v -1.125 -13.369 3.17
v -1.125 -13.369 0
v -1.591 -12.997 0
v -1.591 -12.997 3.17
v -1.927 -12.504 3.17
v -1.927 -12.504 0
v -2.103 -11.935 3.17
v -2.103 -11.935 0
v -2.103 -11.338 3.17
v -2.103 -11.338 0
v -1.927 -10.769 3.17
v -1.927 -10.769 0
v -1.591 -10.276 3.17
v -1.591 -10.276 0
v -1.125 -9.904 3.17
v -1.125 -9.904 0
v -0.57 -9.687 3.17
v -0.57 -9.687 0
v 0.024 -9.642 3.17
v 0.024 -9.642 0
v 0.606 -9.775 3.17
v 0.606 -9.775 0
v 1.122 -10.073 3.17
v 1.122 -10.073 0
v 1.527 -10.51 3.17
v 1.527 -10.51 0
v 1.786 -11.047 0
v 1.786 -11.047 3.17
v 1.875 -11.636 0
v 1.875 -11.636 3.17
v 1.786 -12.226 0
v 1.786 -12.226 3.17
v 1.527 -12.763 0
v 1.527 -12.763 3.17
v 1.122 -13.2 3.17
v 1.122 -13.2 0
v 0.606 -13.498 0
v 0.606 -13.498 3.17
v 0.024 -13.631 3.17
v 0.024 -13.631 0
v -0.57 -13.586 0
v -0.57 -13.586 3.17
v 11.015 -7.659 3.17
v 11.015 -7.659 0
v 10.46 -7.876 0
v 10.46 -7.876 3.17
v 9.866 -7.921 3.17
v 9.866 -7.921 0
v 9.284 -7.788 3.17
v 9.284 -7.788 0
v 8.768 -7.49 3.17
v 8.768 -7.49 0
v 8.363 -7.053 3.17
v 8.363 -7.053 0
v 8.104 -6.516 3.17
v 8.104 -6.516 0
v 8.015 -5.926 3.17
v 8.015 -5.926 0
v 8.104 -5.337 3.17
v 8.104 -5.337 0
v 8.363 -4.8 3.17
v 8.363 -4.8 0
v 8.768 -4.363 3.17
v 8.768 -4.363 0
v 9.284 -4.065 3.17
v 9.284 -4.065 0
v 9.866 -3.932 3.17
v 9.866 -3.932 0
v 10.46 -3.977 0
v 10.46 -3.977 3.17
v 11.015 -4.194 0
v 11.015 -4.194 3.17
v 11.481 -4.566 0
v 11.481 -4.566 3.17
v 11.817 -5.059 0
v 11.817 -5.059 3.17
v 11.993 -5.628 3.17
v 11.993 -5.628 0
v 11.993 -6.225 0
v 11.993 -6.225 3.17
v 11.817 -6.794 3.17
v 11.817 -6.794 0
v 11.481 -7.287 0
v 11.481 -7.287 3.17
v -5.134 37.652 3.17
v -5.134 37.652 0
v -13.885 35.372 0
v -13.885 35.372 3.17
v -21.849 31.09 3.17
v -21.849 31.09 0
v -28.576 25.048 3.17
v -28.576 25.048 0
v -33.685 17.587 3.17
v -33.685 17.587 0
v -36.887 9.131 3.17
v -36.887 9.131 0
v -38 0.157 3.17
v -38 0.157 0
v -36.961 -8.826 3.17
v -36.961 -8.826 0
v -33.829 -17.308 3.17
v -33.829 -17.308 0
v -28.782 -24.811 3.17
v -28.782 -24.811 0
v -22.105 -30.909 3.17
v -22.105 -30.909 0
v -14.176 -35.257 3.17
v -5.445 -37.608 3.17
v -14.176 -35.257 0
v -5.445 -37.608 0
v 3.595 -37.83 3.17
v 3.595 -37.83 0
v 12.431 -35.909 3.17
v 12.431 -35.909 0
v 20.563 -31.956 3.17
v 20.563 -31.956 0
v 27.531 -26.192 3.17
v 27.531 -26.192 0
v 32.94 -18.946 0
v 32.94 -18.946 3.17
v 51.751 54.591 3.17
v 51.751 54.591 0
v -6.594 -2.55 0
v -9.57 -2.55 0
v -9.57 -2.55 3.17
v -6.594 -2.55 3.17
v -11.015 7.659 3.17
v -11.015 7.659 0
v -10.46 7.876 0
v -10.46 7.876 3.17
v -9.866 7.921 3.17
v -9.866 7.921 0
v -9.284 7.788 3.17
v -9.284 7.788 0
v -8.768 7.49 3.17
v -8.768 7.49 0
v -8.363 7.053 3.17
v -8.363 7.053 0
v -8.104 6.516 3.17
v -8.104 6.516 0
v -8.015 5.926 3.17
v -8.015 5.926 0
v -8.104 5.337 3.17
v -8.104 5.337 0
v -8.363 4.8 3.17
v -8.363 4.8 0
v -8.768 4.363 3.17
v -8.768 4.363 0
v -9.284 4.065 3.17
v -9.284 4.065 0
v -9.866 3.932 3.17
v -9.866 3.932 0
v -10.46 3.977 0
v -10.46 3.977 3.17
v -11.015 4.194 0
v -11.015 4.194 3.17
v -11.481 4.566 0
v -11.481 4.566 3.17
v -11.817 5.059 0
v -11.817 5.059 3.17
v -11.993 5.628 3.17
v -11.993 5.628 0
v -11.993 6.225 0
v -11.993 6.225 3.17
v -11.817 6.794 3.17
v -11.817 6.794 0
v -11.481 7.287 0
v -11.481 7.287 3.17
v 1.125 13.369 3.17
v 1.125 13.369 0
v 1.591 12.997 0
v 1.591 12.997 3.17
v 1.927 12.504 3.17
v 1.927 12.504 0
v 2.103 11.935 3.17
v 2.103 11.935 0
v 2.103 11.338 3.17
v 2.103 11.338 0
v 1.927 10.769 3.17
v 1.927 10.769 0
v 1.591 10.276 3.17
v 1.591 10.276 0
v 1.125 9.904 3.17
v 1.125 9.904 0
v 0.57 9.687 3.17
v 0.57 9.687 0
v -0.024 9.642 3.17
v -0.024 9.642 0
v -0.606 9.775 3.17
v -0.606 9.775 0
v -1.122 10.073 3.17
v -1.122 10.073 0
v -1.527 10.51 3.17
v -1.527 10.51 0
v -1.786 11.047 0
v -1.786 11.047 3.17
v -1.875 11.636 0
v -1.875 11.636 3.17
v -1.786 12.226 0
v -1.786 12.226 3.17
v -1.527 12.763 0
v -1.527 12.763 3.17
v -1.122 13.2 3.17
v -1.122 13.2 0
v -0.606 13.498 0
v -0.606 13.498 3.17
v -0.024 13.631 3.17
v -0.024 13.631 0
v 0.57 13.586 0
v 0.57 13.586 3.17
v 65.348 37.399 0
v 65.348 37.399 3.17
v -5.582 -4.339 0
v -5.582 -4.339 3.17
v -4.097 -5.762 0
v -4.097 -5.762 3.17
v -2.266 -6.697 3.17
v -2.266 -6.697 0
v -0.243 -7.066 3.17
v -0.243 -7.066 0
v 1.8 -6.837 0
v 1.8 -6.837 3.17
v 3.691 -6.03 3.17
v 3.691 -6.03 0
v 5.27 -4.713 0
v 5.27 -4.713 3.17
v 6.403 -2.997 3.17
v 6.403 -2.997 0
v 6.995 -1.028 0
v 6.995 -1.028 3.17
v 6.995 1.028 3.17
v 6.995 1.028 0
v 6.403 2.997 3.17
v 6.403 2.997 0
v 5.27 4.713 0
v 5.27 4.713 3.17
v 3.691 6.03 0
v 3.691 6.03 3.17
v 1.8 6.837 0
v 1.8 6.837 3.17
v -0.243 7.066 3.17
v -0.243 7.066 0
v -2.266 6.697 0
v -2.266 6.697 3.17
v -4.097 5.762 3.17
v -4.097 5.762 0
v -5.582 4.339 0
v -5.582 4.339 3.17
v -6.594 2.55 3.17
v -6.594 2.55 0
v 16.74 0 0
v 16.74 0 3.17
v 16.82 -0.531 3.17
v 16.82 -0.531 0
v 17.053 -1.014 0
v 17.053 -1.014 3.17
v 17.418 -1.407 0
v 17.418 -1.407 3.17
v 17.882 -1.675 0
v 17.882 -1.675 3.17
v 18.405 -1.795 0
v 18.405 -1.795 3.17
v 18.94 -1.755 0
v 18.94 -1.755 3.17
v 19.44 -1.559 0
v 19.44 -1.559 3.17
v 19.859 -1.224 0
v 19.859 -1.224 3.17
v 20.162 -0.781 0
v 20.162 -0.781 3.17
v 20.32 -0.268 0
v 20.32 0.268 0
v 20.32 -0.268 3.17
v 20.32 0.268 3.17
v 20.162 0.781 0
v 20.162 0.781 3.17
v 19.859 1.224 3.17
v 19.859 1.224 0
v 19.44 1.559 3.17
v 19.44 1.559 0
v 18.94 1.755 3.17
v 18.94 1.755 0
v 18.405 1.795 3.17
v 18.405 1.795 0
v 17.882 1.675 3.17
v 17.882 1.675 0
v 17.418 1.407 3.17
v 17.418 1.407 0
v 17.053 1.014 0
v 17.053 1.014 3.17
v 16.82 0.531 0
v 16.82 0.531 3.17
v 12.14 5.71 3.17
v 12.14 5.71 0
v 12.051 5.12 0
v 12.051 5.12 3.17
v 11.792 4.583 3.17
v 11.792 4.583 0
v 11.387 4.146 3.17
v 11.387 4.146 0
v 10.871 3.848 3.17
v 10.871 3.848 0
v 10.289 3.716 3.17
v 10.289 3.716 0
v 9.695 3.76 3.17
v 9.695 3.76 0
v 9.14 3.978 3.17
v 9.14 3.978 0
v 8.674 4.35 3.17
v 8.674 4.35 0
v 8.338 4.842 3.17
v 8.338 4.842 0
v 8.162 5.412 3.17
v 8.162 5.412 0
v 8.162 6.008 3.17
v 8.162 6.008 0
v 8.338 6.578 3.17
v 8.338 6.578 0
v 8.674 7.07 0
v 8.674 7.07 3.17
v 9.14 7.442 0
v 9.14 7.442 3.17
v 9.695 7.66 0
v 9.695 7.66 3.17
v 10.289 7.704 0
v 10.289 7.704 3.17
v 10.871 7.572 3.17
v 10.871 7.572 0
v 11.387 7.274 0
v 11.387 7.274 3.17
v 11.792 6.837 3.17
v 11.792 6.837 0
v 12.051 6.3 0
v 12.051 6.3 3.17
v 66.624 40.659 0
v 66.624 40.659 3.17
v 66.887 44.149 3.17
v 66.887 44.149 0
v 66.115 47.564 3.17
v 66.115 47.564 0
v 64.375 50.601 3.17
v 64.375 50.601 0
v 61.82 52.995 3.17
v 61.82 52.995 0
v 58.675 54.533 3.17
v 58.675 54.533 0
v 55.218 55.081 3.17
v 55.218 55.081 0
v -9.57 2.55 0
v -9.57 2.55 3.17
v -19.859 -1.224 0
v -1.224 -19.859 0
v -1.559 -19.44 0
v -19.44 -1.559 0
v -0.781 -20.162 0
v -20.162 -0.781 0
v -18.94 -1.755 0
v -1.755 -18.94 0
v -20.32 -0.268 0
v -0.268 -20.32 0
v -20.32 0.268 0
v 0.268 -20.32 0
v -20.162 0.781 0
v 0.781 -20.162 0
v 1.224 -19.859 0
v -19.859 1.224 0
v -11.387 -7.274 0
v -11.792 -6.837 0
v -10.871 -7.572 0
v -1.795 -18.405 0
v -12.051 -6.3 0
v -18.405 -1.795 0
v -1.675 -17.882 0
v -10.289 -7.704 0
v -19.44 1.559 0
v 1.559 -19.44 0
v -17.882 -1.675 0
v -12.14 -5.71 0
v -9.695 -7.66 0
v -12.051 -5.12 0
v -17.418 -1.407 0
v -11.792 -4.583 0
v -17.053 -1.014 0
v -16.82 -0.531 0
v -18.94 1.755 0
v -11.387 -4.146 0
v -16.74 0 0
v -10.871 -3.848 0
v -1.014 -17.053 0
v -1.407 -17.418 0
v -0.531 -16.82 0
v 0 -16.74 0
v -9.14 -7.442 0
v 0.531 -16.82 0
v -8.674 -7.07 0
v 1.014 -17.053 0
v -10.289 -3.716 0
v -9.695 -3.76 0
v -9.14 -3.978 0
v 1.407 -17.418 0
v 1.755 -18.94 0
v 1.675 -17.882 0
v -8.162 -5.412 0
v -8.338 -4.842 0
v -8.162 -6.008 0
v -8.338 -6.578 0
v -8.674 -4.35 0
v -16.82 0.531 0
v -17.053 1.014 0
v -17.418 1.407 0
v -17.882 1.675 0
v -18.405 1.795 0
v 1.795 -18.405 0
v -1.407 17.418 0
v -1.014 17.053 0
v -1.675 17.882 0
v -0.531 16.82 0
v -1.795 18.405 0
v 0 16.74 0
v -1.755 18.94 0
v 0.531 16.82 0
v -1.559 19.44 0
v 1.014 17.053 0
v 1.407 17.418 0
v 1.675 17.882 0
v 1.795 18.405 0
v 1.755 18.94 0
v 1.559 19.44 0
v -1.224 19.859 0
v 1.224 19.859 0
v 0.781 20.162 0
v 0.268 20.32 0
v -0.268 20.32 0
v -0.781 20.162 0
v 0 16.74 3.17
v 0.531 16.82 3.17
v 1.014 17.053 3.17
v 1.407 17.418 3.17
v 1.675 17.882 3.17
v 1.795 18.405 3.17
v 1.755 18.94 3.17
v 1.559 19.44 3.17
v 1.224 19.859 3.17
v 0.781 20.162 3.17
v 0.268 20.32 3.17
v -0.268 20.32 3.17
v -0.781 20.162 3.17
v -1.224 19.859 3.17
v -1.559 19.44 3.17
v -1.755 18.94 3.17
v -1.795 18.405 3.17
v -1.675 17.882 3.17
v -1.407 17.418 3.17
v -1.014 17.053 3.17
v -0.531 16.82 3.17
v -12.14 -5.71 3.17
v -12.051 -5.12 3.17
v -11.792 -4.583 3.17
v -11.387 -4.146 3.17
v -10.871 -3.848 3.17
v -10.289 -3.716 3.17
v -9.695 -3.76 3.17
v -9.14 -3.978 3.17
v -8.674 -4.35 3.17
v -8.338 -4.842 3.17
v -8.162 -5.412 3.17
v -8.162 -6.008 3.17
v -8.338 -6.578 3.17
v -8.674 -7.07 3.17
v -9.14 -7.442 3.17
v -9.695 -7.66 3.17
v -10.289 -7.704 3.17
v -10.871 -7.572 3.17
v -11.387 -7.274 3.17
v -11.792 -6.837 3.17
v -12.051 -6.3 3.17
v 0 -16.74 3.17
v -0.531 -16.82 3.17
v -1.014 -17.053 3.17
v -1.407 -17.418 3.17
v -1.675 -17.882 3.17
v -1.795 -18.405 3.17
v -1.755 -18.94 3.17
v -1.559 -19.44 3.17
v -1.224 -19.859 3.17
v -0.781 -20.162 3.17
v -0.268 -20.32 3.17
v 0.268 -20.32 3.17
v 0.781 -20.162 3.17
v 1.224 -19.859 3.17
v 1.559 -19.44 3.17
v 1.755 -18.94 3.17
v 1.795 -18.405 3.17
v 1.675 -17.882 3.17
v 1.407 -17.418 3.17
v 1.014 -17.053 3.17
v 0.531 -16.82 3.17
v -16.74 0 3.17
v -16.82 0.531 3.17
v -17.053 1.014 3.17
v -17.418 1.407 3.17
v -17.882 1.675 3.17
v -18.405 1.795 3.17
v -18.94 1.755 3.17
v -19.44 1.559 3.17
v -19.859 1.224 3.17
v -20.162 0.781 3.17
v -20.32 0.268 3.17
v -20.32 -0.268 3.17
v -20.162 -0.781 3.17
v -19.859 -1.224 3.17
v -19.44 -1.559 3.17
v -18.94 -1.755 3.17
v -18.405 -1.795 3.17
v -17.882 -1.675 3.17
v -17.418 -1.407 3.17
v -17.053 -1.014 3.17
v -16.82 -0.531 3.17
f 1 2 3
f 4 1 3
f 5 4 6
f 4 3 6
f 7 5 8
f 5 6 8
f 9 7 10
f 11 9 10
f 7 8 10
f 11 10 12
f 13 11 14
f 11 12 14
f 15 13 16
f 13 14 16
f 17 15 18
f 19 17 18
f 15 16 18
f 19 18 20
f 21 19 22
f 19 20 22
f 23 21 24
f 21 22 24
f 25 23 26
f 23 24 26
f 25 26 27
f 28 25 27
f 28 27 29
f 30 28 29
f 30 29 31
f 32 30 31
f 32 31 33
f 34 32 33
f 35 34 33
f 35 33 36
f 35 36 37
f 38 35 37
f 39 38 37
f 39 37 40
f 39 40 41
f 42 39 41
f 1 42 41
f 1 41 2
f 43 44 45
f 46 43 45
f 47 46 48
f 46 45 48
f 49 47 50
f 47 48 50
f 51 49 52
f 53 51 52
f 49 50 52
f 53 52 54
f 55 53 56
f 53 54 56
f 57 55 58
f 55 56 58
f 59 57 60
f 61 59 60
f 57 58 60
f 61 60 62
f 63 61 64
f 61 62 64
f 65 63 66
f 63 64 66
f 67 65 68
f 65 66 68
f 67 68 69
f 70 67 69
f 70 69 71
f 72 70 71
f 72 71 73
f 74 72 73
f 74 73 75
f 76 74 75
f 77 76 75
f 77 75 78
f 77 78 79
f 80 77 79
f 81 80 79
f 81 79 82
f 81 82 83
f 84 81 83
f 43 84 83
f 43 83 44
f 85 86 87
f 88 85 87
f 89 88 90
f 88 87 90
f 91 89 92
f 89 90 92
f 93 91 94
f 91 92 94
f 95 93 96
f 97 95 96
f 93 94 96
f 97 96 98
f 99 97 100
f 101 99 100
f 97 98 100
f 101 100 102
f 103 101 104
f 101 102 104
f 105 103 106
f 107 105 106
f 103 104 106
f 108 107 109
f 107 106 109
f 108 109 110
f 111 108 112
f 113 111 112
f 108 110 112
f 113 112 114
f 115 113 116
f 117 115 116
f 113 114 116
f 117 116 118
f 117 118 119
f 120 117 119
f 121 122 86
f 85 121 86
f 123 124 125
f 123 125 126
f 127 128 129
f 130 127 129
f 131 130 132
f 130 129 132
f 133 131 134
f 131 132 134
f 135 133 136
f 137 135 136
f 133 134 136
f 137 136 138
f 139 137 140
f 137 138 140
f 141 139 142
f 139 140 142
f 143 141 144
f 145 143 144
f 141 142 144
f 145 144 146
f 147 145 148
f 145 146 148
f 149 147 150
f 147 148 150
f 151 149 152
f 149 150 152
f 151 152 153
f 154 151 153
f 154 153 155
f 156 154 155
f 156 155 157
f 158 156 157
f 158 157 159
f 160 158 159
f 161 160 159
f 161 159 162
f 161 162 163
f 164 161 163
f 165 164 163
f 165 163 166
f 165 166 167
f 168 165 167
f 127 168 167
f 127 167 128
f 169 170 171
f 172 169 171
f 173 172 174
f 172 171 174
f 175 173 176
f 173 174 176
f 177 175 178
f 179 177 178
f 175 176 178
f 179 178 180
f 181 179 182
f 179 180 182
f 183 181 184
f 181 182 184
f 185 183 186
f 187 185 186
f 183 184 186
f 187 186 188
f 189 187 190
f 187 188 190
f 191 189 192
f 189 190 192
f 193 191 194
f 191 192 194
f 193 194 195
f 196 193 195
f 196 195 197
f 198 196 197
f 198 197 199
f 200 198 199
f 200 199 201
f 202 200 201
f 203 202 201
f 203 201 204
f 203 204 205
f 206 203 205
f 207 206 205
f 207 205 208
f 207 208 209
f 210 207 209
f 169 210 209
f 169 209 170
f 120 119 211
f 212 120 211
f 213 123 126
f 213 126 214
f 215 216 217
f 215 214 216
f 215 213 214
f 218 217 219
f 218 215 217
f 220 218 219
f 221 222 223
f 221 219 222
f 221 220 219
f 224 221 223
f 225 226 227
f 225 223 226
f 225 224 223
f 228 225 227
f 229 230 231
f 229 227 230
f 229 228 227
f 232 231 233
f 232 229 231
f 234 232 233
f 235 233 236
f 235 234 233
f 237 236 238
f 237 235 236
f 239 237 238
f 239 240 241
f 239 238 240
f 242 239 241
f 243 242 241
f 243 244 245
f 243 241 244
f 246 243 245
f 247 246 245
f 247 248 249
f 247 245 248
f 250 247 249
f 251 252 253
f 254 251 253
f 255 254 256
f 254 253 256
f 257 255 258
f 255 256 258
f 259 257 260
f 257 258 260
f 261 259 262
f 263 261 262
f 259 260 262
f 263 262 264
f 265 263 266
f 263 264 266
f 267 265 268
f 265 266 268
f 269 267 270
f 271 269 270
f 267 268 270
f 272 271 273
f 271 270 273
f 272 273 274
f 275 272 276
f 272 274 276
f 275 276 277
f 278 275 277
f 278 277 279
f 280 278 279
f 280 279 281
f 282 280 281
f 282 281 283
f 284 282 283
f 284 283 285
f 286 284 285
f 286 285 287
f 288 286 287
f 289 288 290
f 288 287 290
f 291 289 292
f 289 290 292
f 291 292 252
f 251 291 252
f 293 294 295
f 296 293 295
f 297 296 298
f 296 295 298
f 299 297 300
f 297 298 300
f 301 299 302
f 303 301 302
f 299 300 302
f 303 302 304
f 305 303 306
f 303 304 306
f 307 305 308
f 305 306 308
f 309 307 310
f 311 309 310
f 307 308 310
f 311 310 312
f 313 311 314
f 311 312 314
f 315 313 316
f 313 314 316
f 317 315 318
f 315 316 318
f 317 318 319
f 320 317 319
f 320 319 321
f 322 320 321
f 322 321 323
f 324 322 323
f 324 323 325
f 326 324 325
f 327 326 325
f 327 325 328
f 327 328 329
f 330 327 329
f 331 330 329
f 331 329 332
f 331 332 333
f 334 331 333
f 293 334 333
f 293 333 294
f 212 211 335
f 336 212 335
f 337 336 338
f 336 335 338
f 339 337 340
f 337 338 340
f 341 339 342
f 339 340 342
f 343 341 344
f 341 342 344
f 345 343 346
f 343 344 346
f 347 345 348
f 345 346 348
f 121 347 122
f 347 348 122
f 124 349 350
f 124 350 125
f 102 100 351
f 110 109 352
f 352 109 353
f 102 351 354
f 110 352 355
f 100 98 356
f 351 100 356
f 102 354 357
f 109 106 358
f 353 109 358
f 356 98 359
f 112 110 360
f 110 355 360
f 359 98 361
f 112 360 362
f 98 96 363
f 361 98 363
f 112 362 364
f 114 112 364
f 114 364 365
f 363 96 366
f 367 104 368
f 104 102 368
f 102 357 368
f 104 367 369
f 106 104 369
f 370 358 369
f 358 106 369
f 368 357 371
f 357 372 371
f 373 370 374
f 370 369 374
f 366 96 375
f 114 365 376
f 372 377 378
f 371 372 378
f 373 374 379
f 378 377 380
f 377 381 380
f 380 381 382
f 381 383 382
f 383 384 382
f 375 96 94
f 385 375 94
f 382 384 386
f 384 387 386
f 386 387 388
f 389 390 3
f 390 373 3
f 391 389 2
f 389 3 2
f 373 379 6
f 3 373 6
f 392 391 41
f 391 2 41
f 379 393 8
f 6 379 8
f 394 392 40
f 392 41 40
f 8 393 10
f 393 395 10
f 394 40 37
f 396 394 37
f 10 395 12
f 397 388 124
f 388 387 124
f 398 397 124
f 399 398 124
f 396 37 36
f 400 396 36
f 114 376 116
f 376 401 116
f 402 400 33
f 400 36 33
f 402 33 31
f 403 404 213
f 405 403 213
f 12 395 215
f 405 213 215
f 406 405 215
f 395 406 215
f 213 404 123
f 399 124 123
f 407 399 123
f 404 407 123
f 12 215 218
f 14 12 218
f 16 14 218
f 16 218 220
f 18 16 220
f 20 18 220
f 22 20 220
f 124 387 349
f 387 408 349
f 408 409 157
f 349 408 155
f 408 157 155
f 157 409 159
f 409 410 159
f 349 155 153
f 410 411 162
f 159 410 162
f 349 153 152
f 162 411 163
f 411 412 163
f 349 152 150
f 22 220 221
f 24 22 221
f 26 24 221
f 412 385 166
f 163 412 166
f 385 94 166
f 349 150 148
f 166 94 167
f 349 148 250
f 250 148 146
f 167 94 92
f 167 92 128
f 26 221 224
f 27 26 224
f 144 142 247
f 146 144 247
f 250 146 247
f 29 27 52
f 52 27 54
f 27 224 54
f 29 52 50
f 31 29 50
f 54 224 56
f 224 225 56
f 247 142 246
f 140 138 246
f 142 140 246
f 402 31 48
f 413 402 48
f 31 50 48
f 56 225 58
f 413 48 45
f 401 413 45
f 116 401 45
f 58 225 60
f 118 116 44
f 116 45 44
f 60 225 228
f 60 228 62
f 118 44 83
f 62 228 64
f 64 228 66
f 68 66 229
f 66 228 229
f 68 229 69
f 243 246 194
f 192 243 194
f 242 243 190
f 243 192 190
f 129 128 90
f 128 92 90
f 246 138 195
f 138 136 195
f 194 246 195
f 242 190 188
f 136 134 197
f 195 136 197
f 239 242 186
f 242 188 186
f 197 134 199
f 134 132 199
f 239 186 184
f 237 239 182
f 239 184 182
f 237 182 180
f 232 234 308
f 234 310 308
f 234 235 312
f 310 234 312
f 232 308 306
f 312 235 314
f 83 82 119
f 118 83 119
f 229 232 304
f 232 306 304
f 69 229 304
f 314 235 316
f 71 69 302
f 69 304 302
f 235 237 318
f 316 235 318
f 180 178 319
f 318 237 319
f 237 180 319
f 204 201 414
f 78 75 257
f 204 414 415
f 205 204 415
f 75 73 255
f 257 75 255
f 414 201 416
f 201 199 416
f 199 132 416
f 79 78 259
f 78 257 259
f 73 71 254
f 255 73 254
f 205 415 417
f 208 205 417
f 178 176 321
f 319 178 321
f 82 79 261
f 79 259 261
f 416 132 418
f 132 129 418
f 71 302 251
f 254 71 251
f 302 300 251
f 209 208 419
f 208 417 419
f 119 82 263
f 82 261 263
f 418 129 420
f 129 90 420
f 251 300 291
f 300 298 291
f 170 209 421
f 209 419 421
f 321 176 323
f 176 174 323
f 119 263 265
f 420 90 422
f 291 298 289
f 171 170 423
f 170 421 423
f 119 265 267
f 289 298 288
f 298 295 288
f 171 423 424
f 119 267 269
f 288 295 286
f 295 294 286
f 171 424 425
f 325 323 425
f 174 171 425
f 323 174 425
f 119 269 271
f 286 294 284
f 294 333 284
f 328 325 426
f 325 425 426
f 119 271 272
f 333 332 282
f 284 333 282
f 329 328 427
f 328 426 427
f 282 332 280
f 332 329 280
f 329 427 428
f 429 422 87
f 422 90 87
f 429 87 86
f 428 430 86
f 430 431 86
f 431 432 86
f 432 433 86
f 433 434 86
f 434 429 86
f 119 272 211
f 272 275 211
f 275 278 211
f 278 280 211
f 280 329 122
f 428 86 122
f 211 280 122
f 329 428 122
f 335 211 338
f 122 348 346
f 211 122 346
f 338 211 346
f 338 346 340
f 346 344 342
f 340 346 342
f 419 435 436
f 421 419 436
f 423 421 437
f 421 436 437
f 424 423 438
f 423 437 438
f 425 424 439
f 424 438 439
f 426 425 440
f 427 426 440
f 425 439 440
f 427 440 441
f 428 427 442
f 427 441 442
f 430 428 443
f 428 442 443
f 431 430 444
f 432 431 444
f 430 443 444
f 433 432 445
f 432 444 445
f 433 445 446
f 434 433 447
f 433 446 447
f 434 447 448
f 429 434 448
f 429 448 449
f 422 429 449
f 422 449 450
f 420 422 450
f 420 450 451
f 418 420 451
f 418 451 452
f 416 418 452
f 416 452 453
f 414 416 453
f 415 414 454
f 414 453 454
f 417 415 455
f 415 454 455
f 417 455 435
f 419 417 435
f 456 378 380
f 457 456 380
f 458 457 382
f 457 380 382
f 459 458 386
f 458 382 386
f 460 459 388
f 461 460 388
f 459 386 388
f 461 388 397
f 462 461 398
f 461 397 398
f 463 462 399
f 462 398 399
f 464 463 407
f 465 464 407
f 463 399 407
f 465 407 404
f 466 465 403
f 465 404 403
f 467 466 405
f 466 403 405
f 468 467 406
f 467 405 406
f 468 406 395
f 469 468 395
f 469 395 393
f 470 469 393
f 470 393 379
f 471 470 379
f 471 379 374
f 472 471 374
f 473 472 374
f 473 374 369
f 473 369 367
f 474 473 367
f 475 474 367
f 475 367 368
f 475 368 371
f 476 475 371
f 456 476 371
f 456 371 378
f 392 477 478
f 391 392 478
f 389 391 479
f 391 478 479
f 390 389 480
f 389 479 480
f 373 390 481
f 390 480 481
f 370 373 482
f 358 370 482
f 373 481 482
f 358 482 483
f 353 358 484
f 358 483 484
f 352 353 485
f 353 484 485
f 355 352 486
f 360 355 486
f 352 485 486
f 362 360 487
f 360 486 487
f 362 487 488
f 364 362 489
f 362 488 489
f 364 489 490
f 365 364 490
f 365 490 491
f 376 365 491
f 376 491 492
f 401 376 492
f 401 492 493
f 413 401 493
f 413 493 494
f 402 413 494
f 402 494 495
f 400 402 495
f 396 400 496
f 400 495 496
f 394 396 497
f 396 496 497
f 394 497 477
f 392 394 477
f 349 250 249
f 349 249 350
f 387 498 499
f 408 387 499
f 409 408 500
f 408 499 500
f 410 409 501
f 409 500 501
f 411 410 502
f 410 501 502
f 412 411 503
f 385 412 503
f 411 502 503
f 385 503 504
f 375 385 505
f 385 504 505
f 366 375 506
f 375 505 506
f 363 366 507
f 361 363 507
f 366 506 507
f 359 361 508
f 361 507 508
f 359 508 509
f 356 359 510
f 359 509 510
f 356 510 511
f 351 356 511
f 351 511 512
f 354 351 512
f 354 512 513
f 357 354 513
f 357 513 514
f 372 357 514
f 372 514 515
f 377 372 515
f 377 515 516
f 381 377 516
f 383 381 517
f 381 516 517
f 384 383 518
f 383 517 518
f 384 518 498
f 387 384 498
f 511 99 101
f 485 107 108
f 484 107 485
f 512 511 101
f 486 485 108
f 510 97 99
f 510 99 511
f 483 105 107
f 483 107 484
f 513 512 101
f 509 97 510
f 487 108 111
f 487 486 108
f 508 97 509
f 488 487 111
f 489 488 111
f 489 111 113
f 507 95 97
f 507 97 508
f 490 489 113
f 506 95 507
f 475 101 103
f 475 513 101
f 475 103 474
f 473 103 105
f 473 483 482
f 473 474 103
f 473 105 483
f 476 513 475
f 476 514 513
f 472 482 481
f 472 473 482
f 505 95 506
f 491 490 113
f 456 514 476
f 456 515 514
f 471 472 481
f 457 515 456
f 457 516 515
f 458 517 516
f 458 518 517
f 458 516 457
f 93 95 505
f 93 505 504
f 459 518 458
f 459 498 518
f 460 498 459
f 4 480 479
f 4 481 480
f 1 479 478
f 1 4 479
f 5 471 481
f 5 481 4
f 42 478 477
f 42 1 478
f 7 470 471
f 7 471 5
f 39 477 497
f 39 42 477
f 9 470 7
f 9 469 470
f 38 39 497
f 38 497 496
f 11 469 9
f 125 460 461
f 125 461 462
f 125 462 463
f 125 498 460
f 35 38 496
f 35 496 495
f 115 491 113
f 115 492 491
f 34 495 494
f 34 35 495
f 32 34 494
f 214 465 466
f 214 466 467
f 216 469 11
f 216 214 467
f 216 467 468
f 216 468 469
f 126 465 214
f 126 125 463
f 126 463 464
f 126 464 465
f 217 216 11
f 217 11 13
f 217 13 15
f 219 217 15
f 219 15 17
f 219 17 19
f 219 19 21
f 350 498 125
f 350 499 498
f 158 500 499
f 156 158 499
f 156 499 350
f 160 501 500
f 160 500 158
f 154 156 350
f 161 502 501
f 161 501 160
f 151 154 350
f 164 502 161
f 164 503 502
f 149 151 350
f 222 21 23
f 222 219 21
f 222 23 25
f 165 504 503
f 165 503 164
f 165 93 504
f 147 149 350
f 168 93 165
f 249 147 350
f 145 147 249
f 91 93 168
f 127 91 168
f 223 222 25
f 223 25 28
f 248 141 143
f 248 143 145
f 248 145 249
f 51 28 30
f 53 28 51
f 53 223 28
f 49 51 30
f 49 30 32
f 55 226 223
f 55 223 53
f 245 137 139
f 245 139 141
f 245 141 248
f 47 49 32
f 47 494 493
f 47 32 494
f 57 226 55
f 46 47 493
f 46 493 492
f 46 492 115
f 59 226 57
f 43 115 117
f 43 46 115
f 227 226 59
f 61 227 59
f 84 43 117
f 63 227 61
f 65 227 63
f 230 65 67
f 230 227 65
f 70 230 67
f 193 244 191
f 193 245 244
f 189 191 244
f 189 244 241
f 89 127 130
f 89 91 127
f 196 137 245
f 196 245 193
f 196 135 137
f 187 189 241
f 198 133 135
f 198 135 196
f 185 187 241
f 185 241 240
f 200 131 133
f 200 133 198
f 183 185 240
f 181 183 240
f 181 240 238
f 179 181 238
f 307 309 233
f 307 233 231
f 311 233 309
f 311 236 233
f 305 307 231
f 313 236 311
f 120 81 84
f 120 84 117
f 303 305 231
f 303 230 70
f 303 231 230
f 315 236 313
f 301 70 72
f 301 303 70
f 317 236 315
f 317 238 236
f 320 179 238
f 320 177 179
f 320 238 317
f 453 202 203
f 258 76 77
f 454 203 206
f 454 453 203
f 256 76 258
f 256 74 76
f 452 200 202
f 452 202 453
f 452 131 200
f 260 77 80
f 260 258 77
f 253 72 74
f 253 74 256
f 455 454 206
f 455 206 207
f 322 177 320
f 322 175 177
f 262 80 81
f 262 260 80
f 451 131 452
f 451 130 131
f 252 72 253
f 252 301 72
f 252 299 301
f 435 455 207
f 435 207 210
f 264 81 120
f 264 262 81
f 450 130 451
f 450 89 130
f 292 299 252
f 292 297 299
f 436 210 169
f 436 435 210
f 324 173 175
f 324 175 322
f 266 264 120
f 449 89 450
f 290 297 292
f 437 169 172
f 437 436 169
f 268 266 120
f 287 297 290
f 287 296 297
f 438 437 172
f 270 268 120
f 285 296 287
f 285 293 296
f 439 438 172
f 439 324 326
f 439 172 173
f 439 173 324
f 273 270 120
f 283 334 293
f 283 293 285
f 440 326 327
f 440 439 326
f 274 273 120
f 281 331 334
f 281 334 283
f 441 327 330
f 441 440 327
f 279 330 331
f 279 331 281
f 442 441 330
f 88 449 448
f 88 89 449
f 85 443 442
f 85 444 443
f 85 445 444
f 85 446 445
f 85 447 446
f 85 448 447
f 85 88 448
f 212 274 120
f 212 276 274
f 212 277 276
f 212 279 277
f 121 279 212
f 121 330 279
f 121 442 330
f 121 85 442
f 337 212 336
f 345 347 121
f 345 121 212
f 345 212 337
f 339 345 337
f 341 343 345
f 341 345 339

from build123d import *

# Parameters (mm, degrees)
SKETCH1_R             = 7.07
BOSS_EXTRUDE2_DEPTH   = 3.17
SKETCH2_R             = 1.799813297
CUT_EXTRUDE1_DEPTH    = 3.17
CIRPATTERN1_COUNT     = 4
F_4_0MM_DOWEL_HOLE1_D = 4
CIRPATTERN2_COUNT     = 6
CUT_EXTRUDE2_REACH    = 88.731


with BuildPart() as part:
    # Sketch1 → Boss-Extrude2 (new body)
    # profile 1 of 2: a face of its own
    with BuildSketch(Plane.XY):
        with BuildLine():
            ThreePointArc((-5.13430178, 37.651546386), (-31.529571408, -21.210519249), (32.94, -18.946144727))
            ThreePointArc((32.94, -18.946144727), (36.71321288, -9.805100713), (38, 0))
            ThreePointArc((38, 0), (24.988962887, 28.62781399), (-5.13430178, 37.651546386))
        make_face()
        Circle(SKETCH1_R, mode=Mode.SUBTRACT)
    # profile 2 of 2: a face of its own
    with BuildSketch(Plane.XY):
        with BuildLine():
            ThreePointArc((38, 0), (36.71321288, -9.805100713), (32.94, -18.946144727))
            Line((32.94, -18.946144727), (65.347879138, 37.398592116))
            ThreePointArc((65.347879138, 37.398592116), (64.374631715, 50.601425699), (51.751457407, 54.591099312))
            Line((51.751457407, 54.591099312), (-5.13430178, 37.651546386))
            ThreePointArc((-5.13430178, 37.651546386), (24.988962887, 28.62781399), (38, 0))
        make_face()
    extrude(amount=BOSS_EXTRUDE2_DEPTH)

    # Sketch2 → Cut-Extrude1 (cut)
    with BuildSketch(Plane.XY.offset(3.17)):
        with Locations((-18.54, 0)):
            Circle(SKETCH2_R)
    cut_extrude1 = extrude(amount=-CUT_EXTRUDE1_DEPTH, mode=Mode.SUBTRACT)

    # CirPattern1: Cut-Extrude1 ×4 about axis
    cirpattern1_axis = Axis((0, 0, 0), (0, 0, 1))
    for i in range(1, CIRPATTERN1_COUNT):
        add(cut_extrude1.rotate(cirpattern1_axis, i * 360 / CIRPATTERN1_COUNT), mode=Mode.SUBTRACT)

    # Ø4.0mm Dowel Hole1 (through all)
    with Locations(Plane.XY.offset(3.17)):
        with Locations((-10.14, -5.71)):
            f_4_0mm_dowel_hole1 = Hole(F_4_0MM_DOWEL_HOLE1_D / 2)

    # CirPattern2: Ø4.0mm Dowel Hole1 ×6 about axis
    cirpattern2_axis = Axis((0, 0, 0), (0, 0, 1))
    for i in range(1, CIRPATTERN2_COUNT):
        add(f_4_0mm_dowel_hole1.rotate(cirpattern2_axis, i * 360 / CIRPATTERN2_COUNT), mode=Mode.SUBTRACT)

    # Sketch5 → Cut-Extrude2 (cut, up to next)
    with BuildSketch(Plane(origin=(0, 0, 0), x_dir=(-1, 0, 0), z_dir=(0, 0, -1)), mode=Mode.PRIVATE) as cut_extrude2_sk1:
        with BuildLine():
            Line((6.594118592, 2.55), (9.57, 2.55))
            Line((9.57, 2.55), (9.57, -2.55))
            Line((9.57, -2.55), (6.594118592, -2.55))
            ThreePointArc((6.594118592, -2.55), (7.07, 0), (6.594118592, 2.55))
        make_face()
    cut_extrude2_tool1 = extrude(cut_extrude2_sk1.sketch, amount=-CUT_EXTRUDE2_REACH, mode=Mode.PRIVATE) & part.part
    add(cut_extrude2_tool1.solids().sort_by_distance((-8.238036, 0, 0))[0], mode=Mode.SUBTRACT)


solid = part.part
